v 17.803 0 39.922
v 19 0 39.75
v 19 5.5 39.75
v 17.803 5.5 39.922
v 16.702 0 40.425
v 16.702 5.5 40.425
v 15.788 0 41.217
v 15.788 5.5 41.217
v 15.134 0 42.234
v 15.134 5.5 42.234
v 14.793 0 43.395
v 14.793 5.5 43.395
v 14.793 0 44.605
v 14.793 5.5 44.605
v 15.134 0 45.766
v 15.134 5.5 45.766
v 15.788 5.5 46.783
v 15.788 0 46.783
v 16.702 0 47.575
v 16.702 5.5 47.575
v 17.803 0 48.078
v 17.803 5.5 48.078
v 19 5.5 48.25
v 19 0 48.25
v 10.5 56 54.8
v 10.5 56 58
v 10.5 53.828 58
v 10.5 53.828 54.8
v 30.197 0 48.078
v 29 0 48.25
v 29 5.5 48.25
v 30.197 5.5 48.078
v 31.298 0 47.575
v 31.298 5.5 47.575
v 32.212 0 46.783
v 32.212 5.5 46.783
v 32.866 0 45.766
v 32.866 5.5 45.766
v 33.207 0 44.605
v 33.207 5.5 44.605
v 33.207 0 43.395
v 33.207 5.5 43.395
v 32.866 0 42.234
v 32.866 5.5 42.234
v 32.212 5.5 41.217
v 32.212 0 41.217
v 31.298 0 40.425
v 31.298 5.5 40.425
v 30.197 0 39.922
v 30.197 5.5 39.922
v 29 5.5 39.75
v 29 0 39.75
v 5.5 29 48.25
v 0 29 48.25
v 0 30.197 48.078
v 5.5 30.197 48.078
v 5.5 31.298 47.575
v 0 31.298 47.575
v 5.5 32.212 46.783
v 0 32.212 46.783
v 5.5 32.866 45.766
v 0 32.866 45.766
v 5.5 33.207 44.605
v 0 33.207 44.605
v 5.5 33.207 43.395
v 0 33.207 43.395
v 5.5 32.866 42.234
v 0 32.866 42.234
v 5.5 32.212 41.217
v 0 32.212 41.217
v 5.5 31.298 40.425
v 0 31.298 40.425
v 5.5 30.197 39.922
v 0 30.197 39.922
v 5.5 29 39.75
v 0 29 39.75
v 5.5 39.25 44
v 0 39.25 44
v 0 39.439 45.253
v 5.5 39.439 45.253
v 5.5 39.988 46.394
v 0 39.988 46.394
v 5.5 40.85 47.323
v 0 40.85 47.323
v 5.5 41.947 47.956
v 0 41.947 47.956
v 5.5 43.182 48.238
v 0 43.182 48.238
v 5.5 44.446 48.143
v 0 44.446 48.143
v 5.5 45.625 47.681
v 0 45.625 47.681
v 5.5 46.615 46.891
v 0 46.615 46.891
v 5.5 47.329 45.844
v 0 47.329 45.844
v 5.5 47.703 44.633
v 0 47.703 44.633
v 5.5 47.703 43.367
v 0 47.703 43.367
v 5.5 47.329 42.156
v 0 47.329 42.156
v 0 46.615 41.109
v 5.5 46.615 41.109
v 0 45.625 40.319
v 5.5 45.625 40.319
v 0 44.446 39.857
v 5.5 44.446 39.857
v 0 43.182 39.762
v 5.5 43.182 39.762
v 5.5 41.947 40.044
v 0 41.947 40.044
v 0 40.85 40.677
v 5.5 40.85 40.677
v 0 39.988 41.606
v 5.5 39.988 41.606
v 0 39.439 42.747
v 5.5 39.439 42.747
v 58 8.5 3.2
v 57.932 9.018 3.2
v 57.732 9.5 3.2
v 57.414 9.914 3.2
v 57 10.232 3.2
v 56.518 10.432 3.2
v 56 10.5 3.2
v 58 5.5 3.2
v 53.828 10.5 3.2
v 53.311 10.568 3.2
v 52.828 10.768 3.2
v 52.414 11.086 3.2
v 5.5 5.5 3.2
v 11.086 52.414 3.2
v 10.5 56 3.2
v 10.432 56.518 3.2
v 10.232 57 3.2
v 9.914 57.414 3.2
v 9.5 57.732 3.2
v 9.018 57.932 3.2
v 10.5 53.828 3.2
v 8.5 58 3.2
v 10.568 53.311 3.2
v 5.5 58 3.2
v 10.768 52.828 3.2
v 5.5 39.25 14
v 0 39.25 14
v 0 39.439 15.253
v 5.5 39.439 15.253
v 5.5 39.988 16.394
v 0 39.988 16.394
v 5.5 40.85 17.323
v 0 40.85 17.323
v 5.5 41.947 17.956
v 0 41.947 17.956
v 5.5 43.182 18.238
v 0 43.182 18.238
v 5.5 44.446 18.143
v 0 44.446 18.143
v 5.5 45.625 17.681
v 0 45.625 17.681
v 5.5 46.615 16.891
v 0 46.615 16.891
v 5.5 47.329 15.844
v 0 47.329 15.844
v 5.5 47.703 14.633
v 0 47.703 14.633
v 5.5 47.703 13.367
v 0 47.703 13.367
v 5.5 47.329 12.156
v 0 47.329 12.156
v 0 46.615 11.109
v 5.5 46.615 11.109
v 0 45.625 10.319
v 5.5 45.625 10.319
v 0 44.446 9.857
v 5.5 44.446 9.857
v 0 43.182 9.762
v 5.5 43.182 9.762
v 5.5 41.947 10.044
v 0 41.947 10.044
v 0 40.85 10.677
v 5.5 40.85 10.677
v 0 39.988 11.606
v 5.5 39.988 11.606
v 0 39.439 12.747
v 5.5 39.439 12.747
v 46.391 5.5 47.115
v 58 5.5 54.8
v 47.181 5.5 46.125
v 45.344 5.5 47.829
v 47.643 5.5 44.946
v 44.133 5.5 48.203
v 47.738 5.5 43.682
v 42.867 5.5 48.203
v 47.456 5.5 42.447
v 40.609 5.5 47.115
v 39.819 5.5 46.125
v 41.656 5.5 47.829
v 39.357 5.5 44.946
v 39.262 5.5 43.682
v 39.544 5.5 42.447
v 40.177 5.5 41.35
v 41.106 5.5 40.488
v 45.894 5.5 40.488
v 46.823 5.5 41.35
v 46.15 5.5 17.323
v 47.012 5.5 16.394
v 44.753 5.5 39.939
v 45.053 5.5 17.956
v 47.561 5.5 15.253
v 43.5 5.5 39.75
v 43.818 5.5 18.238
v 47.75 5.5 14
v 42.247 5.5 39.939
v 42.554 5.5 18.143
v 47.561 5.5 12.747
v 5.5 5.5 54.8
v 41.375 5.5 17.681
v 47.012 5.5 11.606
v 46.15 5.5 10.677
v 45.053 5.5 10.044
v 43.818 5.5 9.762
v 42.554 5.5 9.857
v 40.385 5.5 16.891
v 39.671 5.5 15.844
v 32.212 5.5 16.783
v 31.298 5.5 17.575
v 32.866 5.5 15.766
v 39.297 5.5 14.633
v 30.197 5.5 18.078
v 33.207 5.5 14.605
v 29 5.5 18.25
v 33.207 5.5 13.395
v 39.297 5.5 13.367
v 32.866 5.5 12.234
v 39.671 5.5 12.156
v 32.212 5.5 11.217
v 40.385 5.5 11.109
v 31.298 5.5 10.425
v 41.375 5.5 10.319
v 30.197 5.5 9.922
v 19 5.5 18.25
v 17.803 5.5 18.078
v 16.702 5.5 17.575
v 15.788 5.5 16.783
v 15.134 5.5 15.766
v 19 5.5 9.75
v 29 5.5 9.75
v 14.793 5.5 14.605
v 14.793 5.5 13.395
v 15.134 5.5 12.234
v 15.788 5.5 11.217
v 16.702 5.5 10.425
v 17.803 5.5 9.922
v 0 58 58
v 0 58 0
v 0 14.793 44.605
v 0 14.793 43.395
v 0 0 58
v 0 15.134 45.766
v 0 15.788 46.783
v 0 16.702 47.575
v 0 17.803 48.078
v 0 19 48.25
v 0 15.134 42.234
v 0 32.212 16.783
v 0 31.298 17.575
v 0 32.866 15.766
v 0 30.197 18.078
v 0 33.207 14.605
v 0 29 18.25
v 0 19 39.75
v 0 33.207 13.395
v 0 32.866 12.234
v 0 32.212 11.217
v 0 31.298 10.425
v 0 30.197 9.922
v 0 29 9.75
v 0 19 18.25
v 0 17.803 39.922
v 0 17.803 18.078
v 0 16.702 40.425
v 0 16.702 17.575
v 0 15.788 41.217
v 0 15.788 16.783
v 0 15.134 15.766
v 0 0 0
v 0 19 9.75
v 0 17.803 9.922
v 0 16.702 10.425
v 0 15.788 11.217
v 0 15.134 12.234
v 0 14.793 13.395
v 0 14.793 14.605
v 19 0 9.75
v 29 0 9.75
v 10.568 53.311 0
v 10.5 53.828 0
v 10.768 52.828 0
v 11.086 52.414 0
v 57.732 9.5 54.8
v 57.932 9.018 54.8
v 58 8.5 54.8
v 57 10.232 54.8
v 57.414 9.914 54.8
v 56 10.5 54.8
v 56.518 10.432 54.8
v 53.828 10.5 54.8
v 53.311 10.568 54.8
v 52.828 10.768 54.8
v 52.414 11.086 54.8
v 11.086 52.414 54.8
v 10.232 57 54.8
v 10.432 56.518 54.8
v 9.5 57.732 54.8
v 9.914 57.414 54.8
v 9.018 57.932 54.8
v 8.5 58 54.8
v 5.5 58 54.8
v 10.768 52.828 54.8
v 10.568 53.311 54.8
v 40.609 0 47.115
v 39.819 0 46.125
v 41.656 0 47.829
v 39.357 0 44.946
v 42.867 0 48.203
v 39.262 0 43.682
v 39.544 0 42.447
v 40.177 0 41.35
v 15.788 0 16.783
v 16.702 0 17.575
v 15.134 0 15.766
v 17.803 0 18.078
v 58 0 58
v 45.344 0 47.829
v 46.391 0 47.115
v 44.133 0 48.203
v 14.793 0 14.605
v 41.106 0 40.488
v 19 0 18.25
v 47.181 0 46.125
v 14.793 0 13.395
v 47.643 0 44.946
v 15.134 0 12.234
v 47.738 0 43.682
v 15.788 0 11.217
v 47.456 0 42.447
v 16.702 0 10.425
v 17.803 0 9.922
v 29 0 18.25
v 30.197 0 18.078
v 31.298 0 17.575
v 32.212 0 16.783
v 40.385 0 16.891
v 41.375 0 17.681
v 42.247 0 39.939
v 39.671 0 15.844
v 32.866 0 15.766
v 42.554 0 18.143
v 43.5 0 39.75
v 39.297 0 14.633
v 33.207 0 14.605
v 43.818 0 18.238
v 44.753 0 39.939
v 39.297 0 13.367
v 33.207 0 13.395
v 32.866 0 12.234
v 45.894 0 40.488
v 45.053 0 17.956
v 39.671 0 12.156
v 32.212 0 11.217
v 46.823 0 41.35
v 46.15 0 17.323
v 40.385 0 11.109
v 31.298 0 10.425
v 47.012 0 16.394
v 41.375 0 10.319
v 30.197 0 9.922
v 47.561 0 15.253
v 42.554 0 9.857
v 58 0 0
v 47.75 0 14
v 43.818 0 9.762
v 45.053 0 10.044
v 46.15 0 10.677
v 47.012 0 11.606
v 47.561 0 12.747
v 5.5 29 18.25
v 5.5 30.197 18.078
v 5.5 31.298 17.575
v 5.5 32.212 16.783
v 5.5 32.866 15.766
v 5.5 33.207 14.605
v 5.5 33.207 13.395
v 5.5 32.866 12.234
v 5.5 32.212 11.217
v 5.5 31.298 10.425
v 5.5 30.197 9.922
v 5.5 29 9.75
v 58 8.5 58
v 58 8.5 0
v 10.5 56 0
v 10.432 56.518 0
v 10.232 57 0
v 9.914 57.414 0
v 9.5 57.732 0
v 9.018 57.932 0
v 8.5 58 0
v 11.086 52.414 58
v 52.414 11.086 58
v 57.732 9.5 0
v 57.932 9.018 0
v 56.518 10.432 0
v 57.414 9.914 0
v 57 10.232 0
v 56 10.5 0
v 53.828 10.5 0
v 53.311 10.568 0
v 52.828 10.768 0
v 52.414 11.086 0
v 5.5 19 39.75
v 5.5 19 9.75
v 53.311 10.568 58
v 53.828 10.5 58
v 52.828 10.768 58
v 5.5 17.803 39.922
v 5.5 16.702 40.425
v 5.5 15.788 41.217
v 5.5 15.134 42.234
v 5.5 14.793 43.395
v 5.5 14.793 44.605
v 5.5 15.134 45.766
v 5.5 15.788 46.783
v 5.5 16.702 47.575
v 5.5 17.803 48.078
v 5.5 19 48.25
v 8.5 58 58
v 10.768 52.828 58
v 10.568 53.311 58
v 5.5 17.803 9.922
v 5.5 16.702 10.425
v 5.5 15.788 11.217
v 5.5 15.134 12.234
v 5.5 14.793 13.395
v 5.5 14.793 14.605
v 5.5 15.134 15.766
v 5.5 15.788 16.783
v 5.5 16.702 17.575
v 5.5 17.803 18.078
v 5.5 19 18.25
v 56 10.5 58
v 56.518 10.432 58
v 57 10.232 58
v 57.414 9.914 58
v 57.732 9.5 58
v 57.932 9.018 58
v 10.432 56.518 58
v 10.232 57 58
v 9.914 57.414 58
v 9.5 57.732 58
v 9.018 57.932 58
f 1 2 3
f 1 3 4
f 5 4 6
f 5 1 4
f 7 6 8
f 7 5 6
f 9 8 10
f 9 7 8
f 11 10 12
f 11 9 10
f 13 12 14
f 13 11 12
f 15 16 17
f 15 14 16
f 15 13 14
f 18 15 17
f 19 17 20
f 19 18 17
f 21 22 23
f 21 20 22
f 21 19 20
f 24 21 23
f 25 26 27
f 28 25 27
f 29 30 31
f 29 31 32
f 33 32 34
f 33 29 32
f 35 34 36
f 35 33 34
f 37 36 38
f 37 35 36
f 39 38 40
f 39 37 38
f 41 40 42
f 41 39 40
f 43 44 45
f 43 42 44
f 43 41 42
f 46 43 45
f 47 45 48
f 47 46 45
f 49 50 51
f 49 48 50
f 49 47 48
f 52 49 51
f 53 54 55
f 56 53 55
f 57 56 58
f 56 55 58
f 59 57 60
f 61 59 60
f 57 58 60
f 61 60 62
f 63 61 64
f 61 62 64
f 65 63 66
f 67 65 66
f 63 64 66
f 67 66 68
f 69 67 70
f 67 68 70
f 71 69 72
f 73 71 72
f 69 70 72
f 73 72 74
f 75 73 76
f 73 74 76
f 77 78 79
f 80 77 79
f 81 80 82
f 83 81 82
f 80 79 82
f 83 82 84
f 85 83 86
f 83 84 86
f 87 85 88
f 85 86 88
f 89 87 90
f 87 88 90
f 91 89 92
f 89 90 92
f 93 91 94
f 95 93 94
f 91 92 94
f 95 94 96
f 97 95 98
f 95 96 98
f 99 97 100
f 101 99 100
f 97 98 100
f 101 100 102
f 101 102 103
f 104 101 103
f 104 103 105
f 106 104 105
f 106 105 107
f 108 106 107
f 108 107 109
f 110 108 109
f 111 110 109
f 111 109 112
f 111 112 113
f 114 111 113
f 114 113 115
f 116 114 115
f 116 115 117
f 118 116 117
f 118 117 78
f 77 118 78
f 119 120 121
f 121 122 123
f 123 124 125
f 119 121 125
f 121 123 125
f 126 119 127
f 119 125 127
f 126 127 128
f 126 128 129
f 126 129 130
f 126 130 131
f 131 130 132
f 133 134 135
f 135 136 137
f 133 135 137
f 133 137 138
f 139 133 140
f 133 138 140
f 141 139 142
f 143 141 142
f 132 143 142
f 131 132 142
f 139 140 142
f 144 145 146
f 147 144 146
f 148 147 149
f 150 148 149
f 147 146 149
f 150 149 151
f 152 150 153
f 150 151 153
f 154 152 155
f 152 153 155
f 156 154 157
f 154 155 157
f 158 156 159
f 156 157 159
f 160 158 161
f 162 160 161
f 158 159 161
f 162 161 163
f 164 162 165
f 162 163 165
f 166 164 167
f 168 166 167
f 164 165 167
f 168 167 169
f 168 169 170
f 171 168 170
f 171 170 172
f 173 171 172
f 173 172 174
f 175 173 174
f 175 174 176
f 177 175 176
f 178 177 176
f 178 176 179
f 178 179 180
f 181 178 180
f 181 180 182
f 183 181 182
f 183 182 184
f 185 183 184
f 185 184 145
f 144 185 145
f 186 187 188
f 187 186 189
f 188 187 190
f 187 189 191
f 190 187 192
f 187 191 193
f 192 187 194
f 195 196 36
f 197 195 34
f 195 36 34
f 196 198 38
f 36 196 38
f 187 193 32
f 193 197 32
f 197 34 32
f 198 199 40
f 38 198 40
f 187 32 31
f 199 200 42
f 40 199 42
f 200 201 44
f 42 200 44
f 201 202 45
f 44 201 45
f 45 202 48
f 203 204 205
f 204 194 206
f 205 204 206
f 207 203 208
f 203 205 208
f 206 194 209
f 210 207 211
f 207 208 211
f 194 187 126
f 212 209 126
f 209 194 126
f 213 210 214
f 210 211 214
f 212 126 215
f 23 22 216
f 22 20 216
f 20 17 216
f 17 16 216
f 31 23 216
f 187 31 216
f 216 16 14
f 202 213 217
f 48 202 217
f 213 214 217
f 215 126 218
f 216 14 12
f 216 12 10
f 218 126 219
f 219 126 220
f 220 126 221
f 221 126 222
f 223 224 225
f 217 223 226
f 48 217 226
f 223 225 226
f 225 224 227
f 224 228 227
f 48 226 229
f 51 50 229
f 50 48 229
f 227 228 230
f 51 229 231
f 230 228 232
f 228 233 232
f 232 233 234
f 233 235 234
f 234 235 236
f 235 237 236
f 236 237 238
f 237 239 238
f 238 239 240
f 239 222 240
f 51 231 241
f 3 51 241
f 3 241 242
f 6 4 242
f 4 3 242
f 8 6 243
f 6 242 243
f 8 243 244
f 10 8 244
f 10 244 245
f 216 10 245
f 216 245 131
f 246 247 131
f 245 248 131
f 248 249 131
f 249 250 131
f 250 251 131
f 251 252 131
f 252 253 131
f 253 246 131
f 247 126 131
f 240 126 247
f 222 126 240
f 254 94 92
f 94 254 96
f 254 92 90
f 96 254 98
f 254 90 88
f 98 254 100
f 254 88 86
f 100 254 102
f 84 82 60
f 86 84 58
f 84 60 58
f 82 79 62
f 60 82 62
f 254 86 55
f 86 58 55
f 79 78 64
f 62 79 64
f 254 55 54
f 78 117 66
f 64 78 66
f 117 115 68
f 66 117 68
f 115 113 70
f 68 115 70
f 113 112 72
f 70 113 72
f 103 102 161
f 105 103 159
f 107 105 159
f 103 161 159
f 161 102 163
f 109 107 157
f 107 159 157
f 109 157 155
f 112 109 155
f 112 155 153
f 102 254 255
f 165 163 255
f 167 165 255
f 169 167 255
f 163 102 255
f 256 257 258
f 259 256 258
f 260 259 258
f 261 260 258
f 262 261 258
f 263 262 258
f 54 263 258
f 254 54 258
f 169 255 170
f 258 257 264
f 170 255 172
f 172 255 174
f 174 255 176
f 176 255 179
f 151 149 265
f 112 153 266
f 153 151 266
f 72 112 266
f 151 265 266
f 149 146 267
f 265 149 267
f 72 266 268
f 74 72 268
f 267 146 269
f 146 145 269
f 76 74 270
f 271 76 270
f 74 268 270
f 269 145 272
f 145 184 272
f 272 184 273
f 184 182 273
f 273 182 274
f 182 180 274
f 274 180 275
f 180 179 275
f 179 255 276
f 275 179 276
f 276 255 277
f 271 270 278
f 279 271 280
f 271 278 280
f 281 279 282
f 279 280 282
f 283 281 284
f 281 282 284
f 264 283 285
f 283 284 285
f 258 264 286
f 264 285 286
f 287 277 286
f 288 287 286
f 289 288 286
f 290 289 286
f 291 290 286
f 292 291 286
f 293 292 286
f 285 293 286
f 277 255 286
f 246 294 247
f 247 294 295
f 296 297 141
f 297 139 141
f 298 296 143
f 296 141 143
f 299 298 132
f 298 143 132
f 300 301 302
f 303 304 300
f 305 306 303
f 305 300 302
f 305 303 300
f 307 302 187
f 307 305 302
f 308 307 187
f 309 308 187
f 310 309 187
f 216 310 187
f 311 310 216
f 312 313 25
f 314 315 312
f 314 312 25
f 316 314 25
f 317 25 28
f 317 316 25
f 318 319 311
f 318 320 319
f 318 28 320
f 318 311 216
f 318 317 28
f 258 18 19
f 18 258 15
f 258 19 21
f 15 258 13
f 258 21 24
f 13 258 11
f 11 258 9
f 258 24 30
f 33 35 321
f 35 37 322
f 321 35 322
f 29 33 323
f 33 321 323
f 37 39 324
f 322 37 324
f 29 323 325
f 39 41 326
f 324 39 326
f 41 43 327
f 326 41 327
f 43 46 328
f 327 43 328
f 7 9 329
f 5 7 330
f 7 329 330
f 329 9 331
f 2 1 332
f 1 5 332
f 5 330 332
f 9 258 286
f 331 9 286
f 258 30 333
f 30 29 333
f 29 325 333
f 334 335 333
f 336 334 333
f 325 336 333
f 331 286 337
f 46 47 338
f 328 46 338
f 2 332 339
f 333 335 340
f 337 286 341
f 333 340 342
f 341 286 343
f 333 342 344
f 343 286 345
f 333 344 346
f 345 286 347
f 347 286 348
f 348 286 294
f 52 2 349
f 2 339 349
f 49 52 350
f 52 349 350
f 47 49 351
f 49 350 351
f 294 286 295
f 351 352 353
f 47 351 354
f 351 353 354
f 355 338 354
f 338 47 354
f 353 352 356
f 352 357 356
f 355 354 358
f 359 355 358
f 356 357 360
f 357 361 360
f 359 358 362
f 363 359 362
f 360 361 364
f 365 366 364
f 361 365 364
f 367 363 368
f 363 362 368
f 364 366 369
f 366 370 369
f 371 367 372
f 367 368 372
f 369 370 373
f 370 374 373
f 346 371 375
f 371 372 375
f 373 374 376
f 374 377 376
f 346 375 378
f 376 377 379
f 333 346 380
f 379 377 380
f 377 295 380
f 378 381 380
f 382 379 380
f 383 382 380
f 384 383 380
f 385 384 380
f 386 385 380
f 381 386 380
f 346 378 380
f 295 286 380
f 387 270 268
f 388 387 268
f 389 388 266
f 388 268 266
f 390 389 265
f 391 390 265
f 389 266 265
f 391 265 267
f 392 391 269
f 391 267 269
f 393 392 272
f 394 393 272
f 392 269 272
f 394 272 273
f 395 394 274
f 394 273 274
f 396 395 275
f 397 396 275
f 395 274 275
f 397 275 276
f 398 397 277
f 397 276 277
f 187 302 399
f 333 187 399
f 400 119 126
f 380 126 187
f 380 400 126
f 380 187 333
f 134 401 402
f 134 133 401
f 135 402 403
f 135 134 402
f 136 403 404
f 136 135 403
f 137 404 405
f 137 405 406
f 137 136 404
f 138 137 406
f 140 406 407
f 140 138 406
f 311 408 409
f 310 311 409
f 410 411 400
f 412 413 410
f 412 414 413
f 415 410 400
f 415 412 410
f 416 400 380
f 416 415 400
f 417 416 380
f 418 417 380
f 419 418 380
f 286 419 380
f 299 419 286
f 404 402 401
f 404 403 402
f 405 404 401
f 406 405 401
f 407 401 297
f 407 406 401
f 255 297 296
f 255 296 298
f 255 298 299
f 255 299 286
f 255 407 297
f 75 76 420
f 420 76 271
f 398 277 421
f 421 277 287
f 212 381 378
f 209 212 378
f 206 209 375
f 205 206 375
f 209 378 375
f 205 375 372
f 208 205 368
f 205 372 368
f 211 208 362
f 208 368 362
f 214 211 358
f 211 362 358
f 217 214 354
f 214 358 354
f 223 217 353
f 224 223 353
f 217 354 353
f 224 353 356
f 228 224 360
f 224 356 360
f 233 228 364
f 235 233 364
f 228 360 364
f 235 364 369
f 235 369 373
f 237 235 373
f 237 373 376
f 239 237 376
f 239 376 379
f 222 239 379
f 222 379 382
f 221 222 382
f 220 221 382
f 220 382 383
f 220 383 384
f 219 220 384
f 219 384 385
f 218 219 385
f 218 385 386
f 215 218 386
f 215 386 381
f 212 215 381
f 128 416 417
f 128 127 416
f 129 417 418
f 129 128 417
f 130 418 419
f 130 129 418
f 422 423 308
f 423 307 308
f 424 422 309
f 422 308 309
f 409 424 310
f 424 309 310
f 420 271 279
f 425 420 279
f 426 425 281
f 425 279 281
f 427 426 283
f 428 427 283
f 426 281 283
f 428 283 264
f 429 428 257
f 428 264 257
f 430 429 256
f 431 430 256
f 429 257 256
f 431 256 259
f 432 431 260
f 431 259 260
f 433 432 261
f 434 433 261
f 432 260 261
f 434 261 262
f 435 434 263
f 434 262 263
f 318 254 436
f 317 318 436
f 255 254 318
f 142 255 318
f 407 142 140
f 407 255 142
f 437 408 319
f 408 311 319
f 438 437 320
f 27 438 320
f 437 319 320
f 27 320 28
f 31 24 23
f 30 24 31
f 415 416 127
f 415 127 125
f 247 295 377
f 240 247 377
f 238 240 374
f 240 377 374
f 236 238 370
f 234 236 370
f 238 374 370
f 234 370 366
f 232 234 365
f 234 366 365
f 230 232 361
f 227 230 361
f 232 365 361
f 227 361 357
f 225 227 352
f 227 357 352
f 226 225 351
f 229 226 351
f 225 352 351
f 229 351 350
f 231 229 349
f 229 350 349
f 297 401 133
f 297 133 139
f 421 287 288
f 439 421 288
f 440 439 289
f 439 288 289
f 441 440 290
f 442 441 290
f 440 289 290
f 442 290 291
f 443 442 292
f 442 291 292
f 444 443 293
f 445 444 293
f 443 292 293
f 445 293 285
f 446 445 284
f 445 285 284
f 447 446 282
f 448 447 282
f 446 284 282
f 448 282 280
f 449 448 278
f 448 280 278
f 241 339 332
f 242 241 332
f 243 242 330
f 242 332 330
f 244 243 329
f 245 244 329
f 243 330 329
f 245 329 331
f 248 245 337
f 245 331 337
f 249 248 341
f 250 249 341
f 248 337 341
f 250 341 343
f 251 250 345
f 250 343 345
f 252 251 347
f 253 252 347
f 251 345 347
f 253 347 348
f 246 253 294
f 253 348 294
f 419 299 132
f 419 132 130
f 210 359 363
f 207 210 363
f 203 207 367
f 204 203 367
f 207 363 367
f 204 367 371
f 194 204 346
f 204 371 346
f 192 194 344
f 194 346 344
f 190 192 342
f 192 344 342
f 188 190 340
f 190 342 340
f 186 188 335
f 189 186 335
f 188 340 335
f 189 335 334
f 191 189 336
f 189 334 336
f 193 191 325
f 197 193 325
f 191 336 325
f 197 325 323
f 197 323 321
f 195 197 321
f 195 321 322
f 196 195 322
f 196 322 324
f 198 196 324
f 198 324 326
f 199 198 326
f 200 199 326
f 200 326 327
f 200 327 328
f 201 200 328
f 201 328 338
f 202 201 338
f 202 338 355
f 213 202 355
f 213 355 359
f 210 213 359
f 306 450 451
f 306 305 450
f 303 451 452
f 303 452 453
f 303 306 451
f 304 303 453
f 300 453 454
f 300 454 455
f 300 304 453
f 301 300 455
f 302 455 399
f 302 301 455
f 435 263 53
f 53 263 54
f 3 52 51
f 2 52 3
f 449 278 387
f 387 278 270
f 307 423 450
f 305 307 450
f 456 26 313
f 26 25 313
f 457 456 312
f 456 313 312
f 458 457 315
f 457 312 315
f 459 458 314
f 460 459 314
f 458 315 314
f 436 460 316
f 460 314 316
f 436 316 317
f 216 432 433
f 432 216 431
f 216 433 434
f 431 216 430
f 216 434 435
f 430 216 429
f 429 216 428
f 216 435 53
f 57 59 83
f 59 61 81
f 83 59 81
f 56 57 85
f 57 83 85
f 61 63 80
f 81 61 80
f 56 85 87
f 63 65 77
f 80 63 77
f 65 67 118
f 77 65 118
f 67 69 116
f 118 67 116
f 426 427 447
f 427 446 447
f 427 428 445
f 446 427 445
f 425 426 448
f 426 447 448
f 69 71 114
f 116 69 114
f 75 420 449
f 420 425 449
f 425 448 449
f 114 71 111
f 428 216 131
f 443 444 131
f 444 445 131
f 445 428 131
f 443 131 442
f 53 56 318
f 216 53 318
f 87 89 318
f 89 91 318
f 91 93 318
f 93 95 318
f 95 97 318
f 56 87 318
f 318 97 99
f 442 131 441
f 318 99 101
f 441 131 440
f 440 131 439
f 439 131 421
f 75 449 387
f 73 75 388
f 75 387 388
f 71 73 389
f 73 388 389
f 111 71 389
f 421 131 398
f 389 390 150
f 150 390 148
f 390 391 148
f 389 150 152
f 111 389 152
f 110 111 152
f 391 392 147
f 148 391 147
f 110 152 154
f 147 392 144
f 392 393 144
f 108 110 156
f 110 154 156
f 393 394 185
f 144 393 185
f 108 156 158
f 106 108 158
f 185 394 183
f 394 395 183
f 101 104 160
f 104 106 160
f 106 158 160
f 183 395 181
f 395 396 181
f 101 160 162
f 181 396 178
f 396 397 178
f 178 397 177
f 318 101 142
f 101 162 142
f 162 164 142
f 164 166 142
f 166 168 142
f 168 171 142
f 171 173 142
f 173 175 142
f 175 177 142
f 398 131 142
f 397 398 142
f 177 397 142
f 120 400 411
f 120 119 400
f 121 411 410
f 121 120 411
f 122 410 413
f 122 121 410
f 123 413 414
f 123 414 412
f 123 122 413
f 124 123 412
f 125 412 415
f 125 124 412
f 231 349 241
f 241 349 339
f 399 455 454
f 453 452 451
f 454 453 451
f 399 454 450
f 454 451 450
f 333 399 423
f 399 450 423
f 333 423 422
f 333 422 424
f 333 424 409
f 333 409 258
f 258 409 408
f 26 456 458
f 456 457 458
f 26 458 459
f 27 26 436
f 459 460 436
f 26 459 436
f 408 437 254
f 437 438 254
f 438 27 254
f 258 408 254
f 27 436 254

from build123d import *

# Parameters (mm, degrees)
EXTRUDE_1_DEPTH     = 58
SKETCH_2_R          = 4.25
CUT_EXTRUDE_1_DEPTH = 58.5
SKETCH_3_R          = 4.25
CUT_EXTRUDE_2_DEPTH = 58.5
EXTRUDE_2_DEPTH     = 3.2
EXTRUDE_3_DEPTH     = 3.2
FILLET_1_R          = 2


with BuildPart() as part:
    # 草图1 → 凸台-拉伸1 (new body)
    with BuildSketch(Plane.XY):
        Polygon((0, 58), (0, 0), (58, 0), (58, 5.5), (5.5, 5.5), (5.5, 58), align=None)
    extrude(amount=EXTRUDE_1_DEPTH)

    # 草图2 → 切除-拉伸1 (cut)
    with BuildSketch(Plane.XZ):
        with Locations(Location((43.5, 44, 0), (0, 0, 270))):
            Circle(SKETCH_2_R)
        with Locations((43.5, 14)):
            Circle(SKETCH_2_R)
        with BuildLine():
            Line((19, 48.25), (29, 48.25))
            ThreePointArc((29, 48.25), (33.25, 44), (29, 39.75))
            Line((29, 39.75), (19, 39.75))
            ThreePointArc((19, 39.75), (14.75, 44), (19, 48.25))
        make_face()
        with BuildLine():
            Line((19, 9.75), (29, 9.75))
            ThreePointArc((29, 9.75), (33.25, 14), (29, 18.25))
            Line((29, 18.25), (19, 18.25))
            ThreePointArc((19, 18.25), (14.75, 14), (19, 9.75))
        make_face()
    extrude(amount=-CUT_EXTRUDE_1_DEPTH, mode=Mode.SUBTRACT)

    # 草图3 → 切除-拉伸2 (cut)
    with BuildSketch(Plane.ZY):
        with Locations(Location((44, 43.5, 0), (0, 0, 270))):
            Circle(SKETCH_3_R)
        with Locations(Location((14, 43.5, 0), (0, 0, 270))):
            Circle(SKETCH_3_R)
        with BuildLine():
            Line((39.75, 29), (39.75, 19))
            ThreePointArc((39.75, 19), (44, 14.75), (48.25, 19))
            Line((48.25, 19), (48.25, 29))
            ThreePointArc((48.25, 29), (44, 33.25), (39.75, 29))
        make_face()
        with BuildLine():
            Line((9.75, 29), (9.75, 19))
            ThreePointArc((9.75, 19), (14, 14.75), (18.25, 19))
            Line((18.25, 19), (18.25, 29))
            ThreePointArc((18.25, 29), (14, 33.25), (9.75, 29))
        make_face()
    extrude(amount=-CUT_EXTRUDE_2_DEPTH, mode=Mode.SUBTRACT)

    # 草图4 → 凸台-拉伸2 (add)
    with BuildSketch(Plane.XY.offset(58)):
        Polygon((5.5, 58), (10.5, 58), (10.5, 53), (53, 10.5), (58, 10.5), (58, 5.5), (5.5, 5.5), align=None)
    extrude(amount=-EXTRUDE_2_DEPTH)

    # 草图5 → 凸台-拉伸3 (add)
    with BuildSketch(Plane(origin=(0, 0, 0), x_dir=(-1, 0, 0), z_dir=(0, 0, -1))):
        Polygon((-10.5, 58), (-10.5, 53), (-53, 10.5), (-58, 10.5), (-58, 5.5), (-5.5, 5.5), (-5.5, 58), align=None)
    extrude(amount=-EXTRUDE_3_DEPTH)

    # 圆角1
    fillet_1_edges = [part.edges().sort_by_distance(p)[0] for p in [
        (10.5, 58, 56.4),
        (10.5, 53, 56.4),
        (53, 10.5, 56.4),
        (58, 10.5, 56.4),
        (10.5, 53, 1.6),
        (10.5, 58, 1.6),
        (58, 10.5, 1.6),
        (53, 10.5, 1.6),
    ]]
    fillet(fillet_1_edges, radius=FILLET_1_R)


solid = part.part
